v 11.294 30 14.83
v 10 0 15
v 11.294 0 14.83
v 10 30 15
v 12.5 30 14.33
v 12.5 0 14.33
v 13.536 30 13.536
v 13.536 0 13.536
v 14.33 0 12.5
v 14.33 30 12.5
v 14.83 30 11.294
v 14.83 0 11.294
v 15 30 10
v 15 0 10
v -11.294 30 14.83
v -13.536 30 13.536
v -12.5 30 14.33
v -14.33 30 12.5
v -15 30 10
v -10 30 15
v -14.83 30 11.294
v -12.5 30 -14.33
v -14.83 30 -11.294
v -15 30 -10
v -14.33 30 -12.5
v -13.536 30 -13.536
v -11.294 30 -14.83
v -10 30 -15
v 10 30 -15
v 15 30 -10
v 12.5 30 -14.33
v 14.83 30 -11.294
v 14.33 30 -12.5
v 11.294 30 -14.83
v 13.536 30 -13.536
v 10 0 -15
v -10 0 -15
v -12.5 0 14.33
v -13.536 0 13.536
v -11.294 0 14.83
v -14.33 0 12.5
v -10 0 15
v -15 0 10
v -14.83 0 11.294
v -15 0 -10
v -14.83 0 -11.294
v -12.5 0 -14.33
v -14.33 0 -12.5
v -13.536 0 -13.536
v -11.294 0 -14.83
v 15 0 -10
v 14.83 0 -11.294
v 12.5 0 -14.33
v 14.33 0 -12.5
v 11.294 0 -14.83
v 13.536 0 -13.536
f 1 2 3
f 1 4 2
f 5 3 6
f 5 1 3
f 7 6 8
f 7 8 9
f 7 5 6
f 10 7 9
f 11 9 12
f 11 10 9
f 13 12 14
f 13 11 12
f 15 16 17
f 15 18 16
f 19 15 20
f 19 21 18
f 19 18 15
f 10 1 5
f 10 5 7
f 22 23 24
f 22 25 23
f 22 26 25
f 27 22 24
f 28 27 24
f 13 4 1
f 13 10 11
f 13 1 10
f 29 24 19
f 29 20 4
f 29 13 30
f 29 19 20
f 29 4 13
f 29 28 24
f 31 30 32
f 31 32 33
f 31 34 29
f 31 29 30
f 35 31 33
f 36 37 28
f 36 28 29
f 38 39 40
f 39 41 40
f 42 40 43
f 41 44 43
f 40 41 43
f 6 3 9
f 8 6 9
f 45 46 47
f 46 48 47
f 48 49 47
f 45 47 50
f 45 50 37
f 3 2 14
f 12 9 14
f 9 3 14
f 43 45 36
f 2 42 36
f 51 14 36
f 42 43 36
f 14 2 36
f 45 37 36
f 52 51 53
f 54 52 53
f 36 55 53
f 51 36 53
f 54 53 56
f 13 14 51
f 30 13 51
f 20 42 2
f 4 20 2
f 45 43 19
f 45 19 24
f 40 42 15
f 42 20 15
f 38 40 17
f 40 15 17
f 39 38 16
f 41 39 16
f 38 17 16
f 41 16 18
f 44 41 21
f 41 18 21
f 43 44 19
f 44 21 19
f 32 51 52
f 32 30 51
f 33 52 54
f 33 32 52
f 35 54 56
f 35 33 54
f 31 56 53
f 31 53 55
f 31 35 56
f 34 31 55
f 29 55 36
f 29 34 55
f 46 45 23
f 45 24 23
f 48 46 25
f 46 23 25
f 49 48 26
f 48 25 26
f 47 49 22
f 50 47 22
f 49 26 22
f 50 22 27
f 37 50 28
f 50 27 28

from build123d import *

# Parameters (mm, degrees)
SKETCH1_W           = 30
SKETCH1_H           = 30
BOSS_EXTRUDE1_DEPTH = 30
FILLET1_R           = 5
FILLET2_R           = 5
FILLET3_R           = 5
FILLET4_R           = 5


with BuildPart() as part:
    # Sketch1 → Boss-Extrude1 (new body)
    with BuildSketch(Plane(origin=(0, 0, 0), x_dir=(1, 0, 0), z_dir=(0, 1, 0))):
        Rectangle(SKETCH1_W, SKETCH1_H)
    extrude(amount=BOSS_EXTRUDE1_DEPTH)

    # Fillet1
    fillet1_edges = [part.edges().sort_by_distance(p)[0] for p in [
        (15, 15, 15),
    ]]
    fillet(fillet1_edges, radius=FILLET1_R)

    # Fillet2
    fillet2_edges = [part.edges().sort_by_distance(p)[0] for p in [
        (15, 15, -15),
    ]]
    fillet(fillet2_edges, radius=FILLET2_R)

    # Fillet3
    fillet3_edges = [part.edges().sort_by_distance(p)[0] for p in [
        (-15, 15, 15),
    ]]
    fillet(fillet3_edges, radius=FILLET3_R)

    # Fillet4
    fillet4_edges = [part.edges().sort_by_distance(p)[0] for p in [
        (-15, 15, -15),
    ]]
    fillet(fillet4_edges, radius=FILLET4_R)


solid = part.part
